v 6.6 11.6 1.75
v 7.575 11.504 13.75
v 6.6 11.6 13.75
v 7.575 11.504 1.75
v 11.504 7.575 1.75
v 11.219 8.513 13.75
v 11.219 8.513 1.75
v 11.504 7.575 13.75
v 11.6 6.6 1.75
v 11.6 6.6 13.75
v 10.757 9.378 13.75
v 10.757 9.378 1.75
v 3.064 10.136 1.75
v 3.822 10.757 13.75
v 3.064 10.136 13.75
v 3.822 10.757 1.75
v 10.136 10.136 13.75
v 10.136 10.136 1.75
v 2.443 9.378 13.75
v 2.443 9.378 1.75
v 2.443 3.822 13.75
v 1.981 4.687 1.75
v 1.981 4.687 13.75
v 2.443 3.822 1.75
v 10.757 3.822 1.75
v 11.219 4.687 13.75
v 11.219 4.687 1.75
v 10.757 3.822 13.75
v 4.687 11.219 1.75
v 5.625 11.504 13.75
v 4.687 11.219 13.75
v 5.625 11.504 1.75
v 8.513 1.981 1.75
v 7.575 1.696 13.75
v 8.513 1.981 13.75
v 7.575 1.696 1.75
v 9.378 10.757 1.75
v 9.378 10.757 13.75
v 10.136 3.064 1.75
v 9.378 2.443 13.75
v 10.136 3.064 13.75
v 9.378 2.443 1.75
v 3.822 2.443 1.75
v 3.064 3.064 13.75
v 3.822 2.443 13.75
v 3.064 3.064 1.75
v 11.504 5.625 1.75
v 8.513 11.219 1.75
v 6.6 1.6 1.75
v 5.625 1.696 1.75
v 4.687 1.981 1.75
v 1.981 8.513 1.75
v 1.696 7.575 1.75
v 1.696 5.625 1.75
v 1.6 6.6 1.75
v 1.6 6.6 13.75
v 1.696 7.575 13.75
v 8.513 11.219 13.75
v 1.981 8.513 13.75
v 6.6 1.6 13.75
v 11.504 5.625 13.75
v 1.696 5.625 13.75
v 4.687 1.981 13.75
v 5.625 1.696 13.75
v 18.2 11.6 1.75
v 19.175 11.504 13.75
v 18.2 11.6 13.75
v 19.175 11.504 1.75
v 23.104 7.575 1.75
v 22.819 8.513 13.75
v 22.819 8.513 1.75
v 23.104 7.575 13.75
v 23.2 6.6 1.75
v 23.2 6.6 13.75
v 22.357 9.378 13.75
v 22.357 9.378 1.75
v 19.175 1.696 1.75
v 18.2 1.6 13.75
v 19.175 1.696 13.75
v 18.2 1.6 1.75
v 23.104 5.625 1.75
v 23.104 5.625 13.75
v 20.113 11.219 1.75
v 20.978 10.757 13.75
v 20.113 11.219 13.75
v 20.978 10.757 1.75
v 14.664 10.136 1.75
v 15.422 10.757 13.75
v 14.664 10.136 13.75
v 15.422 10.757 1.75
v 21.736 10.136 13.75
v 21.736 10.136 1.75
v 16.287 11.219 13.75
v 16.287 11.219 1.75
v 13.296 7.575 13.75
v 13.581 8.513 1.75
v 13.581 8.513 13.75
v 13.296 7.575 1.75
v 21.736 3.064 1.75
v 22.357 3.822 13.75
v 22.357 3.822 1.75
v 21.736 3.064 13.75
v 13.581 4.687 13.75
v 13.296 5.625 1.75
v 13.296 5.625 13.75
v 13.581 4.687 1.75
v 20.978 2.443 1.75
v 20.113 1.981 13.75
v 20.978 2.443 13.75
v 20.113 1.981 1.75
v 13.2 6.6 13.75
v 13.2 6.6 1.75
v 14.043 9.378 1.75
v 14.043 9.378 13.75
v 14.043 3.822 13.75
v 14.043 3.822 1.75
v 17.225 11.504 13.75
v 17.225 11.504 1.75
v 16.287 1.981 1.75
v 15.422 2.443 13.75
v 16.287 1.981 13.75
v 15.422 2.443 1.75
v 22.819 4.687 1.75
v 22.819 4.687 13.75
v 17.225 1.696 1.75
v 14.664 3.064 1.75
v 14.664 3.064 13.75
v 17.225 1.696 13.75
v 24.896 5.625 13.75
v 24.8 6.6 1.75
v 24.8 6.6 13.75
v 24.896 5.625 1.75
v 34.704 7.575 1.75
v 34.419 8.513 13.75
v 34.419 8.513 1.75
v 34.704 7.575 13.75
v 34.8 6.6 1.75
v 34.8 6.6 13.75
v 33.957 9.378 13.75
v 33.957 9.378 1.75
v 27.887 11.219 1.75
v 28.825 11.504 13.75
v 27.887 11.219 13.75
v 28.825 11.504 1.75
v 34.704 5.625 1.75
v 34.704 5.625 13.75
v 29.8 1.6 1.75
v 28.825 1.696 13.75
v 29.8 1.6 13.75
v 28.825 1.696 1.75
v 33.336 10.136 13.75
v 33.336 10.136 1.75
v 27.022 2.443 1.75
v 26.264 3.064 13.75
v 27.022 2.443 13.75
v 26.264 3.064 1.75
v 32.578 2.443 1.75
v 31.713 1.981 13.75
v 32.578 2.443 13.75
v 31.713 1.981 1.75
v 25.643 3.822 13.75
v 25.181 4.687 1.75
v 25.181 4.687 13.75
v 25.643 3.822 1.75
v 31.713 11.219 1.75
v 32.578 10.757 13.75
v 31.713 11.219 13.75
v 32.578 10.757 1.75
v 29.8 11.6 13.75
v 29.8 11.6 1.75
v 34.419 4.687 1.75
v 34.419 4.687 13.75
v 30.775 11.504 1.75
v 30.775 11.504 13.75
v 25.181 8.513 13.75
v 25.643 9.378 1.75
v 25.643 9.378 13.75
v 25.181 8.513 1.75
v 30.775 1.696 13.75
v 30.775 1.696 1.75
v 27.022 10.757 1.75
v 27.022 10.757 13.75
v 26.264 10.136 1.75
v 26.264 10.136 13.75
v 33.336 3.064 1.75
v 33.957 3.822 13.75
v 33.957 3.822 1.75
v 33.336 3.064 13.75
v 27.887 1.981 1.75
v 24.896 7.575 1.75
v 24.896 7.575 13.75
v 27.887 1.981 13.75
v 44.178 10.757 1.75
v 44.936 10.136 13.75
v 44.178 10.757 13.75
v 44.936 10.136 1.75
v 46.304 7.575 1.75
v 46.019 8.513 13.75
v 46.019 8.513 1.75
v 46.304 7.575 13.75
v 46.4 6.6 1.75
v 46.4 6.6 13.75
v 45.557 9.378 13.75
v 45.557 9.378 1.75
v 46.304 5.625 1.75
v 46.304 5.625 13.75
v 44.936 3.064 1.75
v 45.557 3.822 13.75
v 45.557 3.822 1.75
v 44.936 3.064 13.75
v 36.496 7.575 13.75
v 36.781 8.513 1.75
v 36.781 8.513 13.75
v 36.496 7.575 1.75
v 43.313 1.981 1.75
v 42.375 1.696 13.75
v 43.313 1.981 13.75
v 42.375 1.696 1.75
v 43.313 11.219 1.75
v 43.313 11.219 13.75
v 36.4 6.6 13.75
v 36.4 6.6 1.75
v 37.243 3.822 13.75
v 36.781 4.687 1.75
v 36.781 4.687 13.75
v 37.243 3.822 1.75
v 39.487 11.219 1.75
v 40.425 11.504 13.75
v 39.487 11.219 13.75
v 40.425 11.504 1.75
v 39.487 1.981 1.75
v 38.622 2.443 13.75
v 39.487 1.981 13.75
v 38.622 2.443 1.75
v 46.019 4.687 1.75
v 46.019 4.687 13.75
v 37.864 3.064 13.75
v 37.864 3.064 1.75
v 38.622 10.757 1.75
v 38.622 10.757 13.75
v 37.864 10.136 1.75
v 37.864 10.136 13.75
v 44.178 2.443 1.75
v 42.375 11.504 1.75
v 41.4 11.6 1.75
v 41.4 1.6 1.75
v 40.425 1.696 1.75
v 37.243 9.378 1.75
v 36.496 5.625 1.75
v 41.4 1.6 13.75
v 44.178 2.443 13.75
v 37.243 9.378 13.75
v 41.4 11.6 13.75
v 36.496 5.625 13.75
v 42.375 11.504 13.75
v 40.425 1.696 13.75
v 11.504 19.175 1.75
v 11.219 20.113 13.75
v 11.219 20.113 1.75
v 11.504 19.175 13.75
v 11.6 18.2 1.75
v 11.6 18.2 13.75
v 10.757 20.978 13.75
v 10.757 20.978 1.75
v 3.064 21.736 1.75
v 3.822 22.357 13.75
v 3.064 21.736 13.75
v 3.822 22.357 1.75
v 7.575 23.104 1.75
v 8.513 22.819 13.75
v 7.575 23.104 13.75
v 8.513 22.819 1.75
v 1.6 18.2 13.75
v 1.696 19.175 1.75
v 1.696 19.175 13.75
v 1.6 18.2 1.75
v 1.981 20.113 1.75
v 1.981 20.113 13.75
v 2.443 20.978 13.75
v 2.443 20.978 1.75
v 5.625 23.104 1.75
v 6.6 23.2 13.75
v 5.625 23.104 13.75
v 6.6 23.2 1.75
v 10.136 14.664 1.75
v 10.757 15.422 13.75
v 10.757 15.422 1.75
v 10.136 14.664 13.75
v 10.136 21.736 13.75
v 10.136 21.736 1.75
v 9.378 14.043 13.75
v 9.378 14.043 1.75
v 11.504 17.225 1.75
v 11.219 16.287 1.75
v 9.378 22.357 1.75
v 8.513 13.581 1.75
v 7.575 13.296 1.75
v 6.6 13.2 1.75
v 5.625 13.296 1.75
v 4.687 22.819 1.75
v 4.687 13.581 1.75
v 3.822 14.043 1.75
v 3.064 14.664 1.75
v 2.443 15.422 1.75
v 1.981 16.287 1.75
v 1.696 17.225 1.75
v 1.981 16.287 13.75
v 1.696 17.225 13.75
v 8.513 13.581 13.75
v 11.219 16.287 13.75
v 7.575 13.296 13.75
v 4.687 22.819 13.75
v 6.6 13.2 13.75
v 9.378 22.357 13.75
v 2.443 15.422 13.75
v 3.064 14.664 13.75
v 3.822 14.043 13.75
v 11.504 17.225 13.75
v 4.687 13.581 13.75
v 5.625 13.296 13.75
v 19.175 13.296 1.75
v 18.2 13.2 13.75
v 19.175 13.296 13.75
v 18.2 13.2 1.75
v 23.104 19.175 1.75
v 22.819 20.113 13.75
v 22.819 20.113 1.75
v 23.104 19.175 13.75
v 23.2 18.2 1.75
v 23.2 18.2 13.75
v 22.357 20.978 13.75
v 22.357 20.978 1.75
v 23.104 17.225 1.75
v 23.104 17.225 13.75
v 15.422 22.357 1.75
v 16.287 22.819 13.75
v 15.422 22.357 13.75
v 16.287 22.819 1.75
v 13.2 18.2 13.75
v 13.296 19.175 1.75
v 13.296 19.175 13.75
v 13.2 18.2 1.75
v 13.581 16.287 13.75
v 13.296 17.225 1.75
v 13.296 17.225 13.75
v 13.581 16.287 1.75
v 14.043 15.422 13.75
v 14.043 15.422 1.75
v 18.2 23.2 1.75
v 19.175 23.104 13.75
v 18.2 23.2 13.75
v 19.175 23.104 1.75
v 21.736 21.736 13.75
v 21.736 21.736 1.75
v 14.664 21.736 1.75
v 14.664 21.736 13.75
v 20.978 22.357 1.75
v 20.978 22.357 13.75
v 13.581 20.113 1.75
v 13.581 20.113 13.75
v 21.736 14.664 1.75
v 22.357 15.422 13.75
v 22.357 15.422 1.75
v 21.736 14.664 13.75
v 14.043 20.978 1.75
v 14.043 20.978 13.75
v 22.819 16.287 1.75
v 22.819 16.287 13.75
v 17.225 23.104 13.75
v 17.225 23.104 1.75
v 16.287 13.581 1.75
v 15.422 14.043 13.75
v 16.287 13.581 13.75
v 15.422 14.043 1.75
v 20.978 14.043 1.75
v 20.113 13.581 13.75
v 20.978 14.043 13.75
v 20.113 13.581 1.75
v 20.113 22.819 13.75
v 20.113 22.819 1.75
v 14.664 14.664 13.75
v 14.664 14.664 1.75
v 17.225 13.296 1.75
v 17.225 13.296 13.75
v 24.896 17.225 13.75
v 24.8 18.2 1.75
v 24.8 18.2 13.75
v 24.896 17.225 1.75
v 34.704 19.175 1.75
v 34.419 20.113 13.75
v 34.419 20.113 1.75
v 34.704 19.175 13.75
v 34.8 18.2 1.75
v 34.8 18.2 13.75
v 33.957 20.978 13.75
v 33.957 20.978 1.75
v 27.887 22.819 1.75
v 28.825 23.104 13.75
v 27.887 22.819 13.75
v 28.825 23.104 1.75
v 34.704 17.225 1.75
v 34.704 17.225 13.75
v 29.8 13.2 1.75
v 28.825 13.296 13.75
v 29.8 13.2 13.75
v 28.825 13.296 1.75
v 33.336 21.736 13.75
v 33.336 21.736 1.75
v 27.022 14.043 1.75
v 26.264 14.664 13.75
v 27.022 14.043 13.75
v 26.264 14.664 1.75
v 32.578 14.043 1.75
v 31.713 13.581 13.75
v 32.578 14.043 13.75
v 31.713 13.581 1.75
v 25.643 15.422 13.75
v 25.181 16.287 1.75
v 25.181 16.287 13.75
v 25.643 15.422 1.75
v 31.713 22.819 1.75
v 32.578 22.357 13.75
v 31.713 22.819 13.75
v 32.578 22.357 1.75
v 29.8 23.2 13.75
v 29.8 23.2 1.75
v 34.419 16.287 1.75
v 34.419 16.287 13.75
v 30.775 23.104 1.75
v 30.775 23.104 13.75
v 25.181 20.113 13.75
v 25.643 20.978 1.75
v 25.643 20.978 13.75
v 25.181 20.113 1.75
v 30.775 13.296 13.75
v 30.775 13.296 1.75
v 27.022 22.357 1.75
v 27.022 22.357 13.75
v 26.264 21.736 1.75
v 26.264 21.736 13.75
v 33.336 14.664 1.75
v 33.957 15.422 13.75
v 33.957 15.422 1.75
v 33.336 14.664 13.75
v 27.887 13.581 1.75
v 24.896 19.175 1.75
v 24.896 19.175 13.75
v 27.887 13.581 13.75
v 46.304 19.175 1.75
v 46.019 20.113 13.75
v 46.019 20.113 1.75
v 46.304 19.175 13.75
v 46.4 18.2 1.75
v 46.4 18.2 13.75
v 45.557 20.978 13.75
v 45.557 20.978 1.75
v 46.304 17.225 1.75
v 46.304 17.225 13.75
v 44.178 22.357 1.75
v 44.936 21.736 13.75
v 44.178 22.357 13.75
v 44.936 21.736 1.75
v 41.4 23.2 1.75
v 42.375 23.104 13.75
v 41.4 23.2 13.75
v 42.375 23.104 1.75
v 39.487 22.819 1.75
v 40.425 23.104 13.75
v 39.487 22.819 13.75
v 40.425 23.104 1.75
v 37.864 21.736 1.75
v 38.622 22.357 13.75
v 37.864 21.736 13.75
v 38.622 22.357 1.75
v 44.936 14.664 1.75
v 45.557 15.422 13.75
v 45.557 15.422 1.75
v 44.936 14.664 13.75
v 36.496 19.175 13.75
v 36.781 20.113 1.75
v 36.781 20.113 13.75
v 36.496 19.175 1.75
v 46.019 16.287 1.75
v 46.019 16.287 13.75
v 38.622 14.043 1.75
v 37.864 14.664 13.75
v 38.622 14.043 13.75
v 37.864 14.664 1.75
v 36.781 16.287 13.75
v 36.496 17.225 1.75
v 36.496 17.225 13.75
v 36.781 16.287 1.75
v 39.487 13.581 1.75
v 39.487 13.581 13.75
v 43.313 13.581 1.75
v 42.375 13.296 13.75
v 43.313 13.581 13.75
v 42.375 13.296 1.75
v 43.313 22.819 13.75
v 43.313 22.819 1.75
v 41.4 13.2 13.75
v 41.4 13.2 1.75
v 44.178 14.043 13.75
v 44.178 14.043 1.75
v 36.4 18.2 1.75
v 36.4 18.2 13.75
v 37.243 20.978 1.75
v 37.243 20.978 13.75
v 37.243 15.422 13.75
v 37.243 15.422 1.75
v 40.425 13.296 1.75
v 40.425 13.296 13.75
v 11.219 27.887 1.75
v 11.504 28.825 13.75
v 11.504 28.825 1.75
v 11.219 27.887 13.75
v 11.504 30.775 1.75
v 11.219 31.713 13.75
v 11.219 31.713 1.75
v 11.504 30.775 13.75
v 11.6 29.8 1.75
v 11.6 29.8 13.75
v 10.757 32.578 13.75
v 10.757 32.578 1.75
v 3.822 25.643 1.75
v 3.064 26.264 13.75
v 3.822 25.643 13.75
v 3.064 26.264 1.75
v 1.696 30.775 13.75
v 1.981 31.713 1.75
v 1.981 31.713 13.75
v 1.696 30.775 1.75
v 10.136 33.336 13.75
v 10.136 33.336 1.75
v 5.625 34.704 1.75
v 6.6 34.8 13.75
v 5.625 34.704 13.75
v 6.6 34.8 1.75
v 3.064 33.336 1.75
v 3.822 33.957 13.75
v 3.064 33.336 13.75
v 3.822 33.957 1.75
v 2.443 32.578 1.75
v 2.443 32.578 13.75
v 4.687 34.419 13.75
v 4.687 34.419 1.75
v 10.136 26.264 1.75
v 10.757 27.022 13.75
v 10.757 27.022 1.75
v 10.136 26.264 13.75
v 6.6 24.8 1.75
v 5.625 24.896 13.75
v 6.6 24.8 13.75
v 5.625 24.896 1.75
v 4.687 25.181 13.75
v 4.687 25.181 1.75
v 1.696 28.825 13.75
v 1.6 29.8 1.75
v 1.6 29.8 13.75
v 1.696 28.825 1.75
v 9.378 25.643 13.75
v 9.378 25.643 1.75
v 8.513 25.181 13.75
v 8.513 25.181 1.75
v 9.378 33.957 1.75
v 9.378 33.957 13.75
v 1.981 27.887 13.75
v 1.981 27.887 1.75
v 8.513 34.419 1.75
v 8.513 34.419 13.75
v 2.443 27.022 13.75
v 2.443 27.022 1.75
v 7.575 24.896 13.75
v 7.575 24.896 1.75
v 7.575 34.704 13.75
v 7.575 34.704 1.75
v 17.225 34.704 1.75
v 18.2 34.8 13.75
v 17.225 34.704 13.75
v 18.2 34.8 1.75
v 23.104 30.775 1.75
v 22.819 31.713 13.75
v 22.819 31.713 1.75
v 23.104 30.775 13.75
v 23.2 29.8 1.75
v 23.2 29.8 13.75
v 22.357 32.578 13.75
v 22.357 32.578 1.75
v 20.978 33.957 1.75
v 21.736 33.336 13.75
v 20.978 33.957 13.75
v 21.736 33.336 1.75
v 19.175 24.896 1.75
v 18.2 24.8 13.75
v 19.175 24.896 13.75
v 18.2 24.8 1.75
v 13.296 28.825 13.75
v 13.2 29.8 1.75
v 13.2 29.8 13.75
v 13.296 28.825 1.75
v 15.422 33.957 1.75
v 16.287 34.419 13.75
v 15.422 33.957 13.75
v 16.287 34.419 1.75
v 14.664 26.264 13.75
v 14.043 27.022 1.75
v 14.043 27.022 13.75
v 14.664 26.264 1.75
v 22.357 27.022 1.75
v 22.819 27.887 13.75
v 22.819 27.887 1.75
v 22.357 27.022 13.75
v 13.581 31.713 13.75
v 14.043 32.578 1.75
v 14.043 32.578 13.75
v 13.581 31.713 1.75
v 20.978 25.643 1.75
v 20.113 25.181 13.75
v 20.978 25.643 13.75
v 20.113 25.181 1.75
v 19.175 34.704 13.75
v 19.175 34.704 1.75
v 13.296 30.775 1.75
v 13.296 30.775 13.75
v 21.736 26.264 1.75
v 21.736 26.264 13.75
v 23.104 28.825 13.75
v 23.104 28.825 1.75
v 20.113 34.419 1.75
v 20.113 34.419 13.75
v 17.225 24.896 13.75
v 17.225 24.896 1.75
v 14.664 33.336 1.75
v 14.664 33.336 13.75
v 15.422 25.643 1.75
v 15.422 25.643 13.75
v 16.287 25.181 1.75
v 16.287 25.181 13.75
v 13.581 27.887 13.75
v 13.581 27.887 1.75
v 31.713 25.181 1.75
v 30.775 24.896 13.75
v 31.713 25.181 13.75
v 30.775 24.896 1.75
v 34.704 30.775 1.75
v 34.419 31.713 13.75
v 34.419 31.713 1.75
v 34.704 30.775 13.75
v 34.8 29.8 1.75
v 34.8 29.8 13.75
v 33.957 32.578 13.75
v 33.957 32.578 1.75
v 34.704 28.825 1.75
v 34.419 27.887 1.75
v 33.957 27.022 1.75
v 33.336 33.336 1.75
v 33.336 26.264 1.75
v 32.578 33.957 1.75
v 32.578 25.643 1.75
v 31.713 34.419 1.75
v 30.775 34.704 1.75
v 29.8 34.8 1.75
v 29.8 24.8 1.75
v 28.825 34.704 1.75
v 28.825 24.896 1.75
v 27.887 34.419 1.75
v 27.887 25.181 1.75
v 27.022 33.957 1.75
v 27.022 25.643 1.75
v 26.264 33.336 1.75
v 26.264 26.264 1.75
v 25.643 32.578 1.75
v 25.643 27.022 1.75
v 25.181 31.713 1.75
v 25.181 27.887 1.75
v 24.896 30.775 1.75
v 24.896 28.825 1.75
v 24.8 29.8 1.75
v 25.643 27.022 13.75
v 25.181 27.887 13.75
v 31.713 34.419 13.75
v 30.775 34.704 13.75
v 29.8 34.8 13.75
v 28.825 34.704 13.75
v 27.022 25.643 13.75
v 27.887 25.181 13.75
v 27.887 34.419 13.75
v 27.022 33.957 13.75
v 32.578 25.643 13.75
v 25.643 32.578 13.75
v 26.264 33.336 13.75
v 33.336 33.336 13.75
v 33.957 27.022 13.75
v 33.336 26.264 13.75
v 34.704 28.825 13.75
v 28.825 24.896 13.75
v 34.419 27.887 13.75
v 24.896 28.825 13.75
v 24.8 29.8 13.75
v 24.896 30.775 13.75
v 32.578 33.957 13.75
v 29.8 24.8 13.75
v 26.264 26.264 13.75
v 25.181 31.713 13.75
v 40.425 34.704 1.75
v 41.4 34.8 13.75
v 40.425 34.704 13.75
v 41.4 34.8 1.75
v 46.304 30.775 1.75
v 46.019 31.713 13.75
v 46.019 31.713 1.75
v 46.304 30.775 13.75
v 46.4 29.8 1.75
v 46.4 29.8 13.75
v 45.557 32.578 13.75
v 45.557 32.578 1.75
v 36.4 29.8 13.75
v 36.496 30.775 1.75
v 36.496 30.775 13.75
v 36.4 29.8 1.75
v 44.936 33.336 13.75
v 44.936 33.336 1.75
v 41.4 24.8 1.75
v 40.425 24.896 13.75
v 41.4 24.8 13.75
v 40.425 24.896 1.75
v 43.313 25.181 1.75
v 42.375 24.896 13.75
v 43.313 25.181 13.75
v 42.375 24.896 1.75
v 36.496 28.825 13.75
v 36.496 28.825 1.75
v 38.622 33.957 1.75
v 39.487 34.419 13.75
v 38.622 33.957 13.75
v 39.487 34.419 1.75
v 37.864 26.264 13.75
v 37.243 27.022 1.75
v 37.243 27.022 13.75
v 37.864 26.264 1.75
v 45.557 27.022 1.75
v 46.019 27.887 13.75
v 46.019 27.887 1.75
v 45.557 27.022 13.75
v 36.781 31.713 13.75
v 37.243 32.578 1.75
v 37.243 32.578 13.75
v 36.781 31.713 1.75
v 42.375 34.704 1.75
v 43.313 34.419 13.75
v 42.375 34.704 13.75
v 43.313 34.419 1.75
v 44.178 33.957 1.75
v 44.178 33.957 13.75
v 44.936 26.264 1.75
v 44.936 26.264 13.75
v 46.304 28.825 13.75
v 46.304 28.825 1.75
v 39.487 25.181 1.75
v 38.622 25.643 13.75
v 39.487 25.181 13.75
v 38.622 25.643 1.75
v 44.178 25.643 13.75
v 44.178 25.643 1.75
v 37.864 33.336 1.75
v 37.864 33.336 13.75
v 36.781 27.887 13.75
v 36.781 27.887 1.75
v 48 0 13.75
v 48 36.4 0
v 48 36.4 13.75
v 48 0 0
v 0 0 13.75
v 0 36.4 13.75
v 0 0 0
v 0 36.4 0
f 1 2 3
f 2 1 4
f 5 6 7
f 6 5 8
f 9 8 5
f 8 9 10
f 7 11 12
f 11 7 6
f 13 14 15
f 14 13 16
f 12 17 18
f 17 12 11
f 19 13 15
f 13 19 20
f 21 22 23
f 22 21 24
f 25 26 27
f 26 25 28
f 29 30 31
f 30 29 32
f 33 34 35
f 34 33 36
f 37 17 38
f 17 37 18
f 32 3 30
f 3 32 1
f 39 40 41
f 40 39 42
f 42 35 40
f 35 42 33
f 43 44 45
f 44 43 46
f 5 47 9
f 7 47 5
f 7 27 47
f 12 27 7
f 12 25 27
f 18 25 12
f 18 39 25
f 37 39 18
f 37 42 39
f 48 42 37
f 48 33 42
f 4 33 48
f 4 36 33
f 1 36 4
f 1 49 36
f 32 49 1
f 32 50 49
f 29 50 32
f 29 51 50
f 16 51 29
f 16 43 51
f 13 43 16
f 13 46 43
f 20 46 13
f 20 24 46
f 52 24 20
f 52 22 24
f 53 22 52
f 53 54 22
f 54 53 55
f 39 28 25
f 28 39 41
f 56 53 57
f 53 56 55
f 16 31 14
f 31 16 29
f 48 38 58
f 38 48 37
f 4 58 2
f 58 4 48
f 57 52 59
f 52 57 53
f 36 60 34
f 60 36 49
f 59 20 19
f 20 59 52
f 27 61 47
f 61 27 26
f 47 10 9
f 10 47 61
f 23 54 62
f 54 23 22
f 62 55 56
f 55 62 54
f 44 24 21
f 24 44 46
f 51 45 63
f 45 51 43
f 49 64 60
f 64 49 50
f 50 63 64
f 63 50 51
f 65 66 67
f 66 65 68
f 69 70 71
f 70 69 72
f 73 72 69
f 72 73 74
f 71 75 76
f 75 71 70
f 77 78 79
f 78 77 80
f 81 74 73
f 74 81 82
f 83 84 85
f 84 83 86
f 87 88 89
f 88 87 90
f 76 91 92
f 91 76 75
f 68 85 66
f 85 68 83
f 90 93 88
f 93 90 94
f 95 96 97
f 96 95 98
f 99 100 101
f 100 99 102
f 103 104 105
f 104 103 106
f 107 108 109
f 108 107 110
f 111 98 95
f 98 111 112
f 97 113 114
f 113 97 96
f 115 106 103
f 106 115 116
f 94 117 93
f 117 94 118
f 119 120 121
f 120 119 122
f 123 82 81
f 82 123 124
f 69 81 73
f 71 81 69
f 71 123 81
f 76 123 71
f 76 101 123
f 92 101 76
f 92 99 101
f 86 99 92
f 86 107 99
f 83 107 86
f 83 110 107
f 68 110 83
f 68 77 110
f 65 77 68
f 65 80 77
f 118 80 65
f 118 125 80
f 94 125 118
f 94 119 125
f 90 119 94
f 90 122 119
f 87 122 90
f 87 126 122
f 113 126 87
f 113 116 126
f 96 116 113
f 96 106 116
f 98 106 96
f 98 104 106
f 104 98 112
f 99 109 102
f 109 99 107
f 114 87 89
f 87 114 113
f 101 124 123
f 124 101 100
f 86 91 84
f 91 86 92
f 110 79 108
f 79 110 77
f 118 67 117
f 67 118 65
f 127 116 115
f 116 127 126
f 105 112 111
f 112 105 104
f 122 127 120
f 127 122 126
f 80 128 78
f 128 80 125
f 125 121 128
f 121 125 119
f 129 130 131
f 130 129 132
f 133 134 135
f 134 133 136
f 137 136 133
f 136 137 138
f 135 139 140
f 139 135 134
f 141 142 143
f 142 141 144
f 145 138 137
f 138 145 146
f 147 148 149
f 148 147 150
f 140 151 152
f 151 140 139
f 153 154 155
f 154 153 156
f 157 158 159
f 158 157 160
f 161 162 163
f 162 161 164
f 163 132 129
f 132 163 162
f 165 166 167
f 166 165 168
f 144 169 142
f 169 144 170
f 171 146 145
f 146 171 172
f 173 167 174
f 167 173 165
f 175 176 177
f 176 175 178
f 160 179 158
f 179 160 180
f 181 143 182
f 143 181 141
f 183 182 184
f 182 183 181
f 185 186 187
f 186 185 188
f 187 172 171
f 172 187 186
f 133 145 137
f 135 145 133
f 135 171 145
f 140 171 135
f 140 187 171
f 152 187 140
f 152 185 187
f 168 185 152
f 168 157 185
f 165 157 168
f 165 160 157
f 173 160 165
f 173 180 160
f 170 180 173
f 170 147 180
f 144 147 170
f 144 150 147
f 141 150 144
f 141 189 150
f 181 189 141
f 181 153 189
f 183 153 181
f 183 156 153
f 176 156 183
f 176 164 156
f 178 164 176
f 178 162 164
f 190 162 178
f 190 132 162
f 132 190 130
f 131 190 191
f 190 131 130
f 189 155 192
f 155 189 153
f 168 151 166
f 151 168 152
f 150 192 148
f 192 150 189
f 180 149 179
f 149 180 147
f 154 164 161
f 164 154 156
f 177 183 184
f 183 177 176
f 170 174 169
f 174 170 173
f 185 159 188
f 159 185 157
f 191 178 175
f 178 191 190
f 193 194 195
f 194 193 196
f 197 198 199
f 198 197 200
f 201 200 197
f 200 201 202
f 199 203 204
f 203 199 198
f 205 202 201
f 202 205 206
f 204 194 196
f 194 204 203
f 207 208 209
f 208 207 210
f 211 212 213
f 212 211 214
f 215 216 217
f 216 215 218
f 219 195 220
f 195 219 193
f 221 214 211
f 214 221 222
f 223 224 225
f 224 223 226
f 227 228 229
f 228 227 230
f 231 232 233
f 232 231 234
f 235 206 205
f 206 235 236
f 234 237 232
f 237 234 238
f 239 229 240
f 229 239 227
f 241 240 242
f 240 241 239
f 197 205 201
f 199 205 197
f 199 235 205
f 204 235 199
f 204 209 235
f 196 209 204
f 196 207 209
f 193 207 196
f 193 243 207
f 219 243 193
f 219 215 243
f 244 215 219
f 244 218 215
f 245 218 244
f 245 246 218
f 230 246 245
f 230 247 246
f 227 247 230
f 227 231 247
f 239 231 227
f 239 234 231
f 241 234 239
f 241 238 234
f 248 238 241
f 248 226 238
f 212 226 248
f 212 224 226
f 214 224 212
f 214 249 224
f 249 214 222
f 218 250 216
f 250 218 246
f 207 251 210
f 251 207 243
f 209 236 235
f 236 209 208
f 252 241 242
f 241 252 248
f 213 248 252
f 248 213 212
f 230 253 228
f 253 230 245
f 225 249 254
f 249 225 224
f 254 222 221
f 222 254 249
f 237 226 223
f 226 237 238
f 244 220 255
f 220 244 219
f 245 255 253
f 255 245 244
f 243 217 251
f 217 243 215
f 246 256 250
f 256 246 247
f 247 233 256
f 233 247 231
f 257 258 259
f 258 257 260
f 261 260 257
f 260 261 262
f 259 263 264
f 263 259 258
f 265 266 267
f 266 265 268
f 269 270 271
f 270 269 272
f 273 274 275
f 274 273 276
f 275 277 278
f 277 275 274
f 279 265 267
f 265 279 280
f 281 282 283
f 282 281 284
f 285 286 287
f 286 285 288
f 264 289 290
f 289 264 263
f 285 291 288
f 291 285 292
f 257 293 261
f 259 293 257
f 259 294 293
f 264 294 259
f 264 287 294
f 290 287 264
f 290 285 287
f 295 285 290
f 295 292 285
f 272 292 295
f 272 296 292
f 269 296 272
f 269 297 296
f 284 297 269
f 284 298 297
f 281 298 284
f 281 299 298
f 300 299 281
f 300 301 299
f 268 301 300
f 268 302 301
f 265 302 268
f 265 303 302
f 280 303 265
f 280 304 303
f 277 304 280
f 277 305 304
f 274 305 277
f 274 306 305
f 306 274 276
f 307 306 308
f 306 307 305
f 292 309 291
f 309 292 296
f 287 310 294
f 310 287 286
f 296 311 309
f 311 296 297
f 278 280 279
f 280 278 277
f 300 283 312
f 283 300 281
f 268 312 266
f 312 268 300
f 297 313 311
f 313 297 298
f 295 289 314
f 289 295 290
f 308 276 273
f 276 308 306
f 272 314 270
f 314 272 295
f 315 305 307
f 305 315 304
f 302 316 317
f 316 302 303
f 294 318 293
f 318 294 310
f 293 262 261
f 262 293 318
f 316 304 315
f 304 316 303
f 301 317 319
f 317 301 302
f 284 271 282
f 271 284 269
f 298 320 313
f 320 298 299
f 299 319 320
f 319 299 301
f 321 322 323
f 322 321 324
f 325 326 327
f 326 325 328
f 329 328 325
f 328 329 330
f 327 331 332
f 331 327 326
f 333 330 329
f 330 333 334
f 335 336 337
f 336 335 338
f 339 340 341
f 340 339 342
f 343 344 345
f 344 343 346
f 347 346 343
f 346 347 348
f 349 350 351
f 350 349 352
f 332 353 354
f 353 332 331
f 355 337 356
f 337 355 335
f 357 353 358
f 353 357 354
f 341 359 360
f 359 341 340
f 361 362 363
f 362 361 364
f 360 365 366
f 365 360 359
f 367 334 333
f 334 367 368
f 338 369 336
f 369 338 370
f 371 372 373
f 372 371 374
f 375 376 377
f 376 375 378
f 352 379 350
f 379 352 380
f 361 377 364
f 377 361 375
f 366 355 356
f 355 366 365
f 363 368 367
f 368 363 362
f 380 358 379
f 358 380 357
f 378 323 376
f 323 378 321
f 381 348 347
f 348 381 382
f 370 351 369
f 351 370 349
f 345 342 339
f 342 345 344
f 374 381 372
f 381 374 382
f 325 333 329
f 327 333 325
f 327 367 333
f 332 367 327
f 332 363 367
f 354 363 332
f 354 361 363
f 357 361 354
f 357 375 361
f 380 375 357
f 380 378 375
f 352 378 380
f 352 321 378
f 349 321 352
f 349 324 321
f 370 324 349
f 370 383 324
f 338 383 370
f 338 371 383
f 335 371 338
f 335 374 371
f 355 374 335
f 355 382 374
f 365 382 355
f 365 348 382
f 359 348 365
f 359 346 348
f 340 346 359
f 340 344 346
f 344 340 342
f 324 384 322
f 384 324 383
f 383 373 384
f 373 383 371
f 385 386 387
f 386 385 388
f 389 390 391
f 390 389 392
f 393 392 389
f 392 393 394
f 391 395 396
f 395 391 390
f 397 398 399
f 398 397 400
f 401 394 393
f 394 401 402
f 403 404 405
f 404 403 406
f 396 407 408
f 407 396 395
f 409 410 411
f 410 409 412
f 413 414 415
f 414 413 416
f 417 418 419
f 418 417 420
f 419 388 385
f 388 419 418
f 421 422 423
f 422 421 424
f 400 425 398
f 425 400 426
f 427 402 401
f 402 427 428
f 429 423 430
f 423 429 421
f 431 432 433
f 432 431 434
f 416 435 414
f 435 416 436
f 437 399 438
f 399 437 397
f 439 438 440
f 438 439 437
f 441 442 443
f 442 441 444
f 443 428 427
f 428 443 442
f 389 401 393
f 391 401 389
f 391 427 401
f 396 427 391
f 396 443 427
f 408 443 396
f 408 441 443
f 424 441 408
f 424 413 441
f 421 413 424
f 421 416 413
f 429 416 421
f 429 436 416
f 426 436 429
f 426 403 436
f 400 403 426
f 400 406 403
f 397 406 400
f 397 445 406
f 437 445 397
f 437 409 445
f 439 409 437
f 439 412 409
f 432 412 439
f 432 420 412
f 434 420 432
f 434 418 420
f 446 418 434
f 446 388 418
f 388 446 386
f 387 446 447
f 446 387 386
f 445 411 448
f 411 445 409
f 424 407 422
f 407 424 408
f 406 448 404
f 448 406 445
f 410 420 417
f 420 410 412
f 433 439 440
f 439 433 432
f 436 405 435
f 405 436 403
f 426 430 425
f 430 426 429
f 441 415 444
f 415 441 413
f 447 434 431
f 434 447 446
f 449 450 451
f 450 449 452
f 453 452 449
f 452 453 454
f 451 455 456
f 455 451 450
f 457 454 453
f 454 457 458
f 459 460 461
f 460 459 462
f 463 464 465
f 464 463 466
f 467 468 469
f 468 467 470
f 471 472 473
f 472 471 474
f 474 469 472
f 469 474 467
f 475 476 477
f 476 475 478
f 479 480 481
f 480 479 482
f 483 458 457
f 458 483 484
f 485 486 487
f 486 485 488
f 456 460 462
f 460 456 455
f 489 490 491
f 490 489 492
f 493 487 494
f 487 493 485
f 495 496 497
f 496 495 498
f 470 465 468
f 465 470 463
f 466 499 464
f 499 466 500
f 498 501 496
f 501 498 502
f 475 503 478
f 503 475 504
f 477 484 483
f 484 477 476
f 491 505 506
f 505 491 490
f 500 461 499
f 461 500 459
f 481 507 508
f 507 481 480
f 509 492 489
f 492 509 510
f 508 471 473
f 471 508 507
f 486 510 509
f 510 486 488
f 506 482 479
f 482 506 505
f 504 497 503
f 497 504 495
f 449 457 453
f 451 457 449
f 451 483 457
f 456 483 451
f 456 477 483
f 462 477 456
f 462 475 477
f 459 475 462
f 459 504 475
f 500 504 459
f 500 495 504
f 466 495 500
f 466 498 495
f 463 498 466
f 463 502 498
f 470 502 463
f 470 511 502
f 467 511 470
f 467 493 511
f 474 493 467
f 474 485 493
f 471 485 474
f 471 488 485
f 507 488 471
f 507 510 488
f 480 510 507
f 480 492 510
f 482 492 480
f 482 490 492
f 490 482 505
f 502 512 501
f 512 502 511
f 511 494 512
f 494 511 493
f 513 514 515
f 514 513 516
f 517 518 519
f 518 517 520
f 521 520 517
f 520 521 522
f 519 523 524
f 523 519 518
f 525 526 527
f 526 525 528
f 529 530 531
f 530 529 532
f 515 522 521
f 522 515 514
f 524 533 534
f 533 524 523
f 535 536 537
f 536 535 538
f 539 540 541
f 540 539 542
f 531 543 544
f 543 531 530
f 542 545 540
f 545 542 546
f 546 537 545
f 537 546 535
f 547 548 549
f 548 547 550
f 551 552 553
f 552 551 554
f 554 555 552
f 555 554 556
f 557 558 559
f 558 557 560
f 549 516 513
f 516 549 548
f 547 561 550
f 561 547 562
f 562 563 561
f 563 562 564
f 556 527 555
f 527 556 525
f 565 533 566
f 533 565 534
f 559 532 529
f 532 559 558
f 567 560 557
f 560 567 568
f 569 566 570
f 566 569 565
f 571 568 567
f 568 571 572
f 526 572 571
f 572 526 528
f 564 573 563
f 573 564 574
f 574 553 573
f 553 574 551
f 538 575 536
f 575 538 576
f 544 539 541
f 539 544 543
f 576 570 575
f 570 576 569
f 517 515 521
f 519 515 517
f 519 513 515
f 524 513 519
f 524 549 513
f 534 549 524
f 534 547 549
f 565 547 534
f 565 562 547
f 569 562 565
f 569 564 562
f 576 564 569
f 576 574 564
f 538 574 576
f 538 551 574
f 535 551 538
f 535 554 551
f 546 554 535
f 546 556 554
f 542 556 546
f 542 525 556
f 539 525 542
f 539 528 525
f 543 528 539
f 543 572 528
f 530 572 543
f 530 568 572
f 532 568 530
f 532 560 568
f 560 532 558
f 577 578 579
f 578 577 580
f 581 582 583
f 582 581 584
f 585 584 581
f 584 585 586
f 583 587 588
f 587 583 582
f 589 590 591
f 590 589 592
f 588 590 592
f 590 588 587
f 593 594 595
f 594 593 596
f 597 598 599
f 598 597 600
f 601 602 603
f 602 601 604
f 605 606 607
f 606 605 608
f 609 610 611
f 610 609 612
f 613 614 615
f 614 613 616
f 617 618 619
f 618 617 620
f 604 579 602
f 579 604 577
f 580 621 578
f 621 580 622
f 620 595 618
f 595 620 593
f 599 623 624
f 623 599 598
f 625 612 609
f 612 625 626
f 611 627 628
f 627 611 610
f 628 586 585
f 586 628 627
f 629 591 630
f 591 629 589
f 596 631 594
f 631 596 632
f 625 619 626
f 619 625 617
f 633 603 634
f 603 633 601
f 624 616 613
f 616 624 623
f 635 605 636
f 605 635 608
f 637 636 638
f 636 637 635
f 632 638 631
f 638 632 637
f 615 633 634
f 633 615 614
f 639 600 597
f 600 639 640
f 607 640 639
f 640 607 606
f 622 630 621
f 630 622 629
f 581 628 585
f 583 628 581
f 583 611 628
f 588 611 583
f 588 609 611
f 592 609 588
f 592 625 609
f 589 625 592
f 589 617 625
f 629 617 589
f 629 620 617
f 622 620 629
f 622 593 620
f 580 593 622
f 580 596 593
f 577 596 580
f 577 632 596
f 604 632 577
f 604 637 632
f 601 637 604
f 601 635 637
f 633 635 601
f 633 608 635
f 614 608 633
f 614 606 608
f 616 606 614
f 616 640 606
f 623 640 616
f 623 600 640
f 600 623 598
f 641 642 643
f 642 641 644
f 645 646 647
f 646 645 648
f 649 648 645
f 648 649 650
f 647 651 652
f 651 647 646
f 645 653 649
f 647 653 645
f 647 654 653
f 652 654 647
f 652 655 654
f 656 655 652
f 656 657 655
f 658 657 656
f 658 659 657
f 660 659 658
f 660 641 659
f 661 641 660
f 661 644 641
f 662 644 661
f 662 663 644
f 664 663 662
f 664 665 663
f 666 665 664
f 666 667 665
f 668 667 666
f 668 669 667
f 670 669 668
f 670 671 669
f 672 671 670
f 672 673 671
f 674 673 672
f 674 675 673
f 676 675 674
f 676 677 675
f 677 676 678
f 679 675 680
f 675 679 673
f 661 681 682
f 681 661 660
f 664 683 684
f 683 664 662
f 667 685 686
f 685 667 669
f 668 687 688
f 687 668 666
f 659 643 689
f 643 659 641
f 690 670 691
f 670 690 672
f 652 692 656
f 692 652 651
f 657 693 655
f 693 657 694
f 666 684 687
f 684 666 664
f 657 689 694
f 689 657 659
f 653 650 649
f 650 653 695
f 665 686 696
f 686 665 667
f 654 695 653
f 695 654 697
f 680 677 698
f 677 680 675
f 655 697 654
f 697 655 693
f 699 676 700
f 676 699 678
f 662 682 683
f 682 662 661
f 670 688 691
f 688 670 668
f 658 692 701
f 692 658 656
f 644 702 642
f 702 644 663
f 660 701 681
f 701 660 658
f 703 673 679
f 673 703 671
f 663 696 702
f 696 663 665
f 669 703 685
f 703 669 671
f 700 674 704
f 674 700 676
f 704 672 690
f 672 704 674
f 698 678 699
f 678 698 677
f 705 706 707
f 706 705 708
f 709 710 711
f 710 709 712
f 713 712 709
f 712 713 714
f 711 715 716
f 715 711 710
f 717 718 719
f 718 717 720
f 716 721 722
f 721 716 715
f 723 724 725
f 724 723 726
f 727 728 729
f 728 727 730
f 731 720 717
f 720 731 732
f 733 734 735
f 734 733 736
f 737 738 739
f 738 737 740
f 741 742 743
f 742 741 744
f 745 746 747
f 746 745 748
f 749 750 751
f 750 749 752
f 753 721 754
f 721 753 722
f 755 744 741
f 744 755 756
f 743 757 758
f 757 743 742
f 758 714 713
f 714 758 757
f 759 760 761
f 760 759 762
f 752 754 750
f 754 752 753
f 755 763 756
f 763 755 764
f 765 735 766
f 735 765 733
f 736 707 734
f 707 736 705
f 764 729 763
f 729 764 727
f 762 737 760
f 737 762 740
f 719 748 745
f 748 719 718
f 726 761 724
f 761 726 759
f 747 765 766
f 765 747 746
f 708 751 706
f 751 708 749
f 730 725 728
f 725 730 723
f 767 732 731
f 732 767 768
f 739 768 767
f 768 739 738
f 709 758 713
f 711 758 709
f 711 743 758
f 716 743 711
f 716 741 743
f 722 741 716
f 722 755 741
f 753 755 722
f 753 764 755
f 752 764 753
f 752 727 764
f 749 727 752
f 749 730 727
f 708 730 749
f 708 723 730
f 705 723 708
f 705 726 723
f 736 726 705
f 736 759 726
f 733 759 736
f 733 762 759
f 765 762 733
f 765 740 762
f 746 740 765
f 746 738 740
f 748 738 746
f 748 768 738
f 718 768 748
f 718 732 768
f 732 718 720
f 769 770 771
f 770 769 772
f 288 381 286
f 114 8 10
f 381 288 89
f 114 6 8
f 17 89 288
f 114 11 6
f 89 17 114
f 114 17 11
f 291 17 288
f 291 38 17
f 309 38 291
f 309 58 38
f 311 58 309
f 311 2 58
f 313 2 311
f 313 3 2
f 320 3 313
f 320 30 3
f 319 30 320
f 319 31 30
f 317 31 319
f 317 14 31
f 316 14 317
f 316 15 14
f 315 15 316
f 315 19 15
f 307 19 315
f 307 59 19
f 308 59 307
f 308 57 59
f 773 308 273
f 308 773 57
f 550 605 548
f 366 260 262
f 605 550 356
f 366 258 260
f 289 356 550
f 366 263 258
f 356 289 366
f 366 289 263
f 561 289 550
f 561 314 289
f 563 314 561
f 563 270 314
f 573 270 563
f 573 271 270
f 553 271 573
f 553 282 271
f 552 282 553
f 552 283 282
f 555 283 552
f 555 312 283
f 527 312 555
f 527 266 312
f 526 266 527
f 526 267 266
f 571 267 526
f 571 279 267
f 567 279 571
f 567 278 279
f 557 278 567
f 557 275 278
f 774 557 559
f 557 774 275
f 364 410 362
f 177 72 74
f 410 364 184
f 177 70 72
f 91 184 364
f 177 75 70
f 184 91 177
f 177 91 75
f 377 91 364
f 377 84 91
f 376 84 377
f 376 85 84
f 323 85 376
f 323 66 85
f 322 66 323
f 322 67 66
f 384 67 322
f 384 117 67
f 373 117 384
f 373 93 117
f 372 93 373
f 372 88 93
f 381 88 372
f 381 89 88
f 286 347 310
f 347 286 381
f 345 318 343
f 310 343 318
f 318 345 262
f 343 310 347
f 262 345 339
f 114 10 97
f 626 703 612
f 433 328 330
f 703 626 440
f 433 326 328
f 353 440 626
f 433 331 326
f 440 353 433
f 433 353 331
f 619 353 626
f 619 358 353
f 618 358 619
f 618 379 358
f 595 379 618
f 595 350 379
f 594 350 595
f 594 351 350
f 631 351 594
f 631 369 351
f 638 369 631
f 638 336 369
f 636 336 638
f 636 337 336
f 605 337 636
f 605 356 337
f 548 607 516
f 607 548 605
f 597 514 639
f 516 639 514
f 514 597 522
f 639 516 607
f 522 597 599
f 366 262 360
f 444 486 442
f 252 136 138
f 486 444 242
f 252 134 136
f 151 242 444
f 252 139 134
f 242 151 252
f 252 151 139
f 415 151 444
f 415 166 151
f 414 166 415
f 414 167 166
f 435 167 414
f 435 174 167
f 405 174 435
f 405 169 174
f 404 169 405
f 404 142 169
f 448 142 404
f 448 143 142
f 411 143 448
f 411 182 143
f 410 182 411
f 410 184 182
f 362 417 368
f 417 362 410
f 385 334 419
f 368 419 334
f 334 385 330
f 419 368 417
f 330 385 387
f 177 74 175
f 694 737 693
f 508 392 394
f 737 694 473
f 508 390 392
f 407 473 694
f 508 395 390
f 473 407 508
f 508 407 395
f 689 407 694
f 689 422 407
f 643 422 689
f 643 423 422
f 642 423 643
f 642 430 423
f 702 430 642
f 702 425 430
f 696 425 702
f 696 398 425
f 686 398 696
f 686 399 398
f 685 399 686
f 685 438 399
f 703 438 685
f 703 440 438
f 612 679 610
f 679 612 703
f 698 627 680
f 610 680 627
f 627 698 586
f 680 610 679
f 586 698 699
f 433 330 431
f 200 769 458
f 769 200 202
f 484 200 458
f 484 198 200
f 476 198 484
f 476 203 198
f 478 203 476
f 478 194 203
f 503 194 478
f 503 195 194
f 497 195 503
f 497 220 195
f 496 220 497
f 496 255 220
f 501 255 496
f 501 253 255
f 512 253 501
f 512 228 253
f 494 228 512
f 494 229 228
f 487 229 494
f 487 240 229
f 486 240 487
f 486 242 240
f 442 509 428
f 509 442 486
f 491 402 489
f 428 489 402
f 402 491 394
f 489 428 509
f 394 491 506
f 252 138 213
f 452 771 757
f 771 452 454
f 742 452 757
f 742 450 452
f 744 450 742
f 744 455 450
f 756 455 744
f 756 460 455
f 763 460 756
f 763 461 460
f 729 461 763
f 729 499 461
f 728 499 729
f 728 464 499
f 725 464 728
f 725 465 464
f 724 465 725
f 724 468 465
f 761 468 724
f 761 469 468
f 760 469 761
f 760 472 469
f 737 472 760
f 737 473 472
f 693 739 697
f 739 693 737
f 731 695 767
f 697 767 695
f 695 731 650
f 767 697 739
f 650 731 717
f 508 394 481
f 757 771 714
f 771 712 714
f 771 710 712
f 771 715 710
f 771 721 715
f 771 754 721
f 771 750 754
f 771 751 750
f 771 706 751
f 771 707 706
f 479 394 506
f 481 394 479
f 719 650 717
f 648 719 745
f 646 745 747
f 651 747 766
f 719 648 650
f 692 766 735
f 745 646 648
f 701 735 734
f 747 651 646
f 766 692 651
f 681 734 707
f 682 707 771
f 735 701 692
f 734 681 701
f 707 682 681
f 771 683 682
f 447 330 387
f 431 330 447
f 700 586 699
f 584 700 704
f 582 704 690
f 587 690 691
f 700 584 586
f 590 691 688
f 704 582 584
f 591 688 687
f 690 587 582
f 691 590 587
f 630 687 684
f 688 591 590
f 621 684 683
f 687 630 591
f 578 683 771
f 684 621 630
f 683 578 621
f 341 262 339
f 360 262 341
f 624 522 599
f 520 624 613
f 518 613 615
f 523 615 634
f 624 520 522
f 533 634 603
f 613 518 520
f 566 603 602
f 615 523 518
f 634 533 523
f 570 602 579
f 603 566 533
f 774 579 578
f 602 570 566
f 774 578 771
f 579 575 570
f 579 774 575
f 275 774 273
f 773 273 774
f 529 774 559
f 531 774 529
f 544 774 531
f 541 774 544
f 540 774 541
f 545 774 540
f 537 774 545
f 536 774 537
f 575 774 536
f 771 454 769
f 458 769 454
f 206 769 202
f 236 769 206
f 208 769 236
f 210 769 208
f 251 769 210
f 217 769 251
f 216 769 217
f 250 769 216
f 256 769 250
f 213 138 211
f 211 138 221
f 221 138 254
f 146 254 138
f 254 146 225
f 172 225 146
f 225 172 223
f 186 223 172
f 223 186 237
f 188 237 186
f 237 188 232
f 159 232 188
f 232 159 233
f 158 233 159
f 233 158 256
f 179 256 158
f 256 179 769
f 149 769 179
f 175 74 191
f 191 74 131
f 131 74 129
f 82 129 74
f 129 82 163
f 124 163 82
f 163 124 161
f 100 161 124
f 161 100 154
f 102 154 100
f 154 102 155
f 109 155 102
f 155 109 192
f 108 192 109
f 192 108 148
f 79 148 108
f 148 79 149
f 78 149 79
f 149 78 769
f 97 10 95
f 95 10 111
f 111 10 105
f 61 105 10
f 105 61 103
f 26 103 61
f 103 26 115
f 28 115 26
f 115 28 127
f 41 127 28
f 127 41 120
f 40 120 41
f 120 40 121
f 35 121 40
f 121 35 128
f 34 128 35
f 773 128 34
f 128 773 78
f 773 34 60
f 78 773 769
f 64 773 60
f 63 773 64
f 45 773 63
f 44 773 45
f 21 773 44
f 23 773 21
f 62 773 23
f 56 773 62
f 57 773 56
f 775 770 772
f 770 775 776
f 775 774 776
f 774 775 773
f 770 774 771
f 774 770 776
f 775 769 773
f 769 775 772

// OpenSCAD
//design and code by emanresu (http://www.thingiverse.com/Emanresu)
//This code generates a rack with round or square holes.

//CUSTOMIZER VARIABLES



//round or square holes?
hole_shape=1; //[1:Round,0:Square]
//length of edge/diameter if square/round holes (mm)
hole_size=10;
//depth of hole (mm)
hole_depth=12;
//number of rows along the x axis
rows=4;
//number of columns along the y axis
columns=3;
//space between holes (mm)
spacing=1.6;
//thickness of bottom layer (mm)
bottom_thick=1.75;


/* [Hidden] */

//set openSCAD resolution
$fa=1;
$fs=1;


//takes an appropriately sized block and removes an array of holes
difference() {
	//main body
	cube(size=[rows*(hole_size+spacing)+spacing, columns*(hole_size+spacing)+spacing, bottom_thick+hole_depth], center=false);
	//holes
	holes(hole_shape,hole_size,hole_depth,rows,columns,spacing,bottom_thick);
}



module holes(hole_shape,hole_size,hole_depth,rows,columns,spacing,bottom_thick) {
	//This module generates an array of holes with one corner at the origin
	//moves the array of holes to be alligned with a non-centered cube later
	//moves corner of array to origin, raises holes by bottom_thick
	translate([hole_size/2+spacing, hole_size/2+spacing, hole_depth/2+bottom_thick+0.5]) {
		//generating rows and columns of holes
		//columns are Y axis
		for (b=[0:columns-1]) {
			//rows are X axis
			for (i=[0:rows-1]) {
				translate([i*(hole_size+spacing), b*(hole_size+spacing), 0]) {
					//square or round holes?
					//value of 1 = circles
					if (hole_shape==1) {
						cylinder(r=hole_size/2, h=hole_depth+1, center=true);
					}
					//any value not equal to 1 generates square holes
					else {cube(size=[hole_size, hole_size, hole_depth+1], center=true);
					}
						
					
				}
			}
		}	
	}
}
